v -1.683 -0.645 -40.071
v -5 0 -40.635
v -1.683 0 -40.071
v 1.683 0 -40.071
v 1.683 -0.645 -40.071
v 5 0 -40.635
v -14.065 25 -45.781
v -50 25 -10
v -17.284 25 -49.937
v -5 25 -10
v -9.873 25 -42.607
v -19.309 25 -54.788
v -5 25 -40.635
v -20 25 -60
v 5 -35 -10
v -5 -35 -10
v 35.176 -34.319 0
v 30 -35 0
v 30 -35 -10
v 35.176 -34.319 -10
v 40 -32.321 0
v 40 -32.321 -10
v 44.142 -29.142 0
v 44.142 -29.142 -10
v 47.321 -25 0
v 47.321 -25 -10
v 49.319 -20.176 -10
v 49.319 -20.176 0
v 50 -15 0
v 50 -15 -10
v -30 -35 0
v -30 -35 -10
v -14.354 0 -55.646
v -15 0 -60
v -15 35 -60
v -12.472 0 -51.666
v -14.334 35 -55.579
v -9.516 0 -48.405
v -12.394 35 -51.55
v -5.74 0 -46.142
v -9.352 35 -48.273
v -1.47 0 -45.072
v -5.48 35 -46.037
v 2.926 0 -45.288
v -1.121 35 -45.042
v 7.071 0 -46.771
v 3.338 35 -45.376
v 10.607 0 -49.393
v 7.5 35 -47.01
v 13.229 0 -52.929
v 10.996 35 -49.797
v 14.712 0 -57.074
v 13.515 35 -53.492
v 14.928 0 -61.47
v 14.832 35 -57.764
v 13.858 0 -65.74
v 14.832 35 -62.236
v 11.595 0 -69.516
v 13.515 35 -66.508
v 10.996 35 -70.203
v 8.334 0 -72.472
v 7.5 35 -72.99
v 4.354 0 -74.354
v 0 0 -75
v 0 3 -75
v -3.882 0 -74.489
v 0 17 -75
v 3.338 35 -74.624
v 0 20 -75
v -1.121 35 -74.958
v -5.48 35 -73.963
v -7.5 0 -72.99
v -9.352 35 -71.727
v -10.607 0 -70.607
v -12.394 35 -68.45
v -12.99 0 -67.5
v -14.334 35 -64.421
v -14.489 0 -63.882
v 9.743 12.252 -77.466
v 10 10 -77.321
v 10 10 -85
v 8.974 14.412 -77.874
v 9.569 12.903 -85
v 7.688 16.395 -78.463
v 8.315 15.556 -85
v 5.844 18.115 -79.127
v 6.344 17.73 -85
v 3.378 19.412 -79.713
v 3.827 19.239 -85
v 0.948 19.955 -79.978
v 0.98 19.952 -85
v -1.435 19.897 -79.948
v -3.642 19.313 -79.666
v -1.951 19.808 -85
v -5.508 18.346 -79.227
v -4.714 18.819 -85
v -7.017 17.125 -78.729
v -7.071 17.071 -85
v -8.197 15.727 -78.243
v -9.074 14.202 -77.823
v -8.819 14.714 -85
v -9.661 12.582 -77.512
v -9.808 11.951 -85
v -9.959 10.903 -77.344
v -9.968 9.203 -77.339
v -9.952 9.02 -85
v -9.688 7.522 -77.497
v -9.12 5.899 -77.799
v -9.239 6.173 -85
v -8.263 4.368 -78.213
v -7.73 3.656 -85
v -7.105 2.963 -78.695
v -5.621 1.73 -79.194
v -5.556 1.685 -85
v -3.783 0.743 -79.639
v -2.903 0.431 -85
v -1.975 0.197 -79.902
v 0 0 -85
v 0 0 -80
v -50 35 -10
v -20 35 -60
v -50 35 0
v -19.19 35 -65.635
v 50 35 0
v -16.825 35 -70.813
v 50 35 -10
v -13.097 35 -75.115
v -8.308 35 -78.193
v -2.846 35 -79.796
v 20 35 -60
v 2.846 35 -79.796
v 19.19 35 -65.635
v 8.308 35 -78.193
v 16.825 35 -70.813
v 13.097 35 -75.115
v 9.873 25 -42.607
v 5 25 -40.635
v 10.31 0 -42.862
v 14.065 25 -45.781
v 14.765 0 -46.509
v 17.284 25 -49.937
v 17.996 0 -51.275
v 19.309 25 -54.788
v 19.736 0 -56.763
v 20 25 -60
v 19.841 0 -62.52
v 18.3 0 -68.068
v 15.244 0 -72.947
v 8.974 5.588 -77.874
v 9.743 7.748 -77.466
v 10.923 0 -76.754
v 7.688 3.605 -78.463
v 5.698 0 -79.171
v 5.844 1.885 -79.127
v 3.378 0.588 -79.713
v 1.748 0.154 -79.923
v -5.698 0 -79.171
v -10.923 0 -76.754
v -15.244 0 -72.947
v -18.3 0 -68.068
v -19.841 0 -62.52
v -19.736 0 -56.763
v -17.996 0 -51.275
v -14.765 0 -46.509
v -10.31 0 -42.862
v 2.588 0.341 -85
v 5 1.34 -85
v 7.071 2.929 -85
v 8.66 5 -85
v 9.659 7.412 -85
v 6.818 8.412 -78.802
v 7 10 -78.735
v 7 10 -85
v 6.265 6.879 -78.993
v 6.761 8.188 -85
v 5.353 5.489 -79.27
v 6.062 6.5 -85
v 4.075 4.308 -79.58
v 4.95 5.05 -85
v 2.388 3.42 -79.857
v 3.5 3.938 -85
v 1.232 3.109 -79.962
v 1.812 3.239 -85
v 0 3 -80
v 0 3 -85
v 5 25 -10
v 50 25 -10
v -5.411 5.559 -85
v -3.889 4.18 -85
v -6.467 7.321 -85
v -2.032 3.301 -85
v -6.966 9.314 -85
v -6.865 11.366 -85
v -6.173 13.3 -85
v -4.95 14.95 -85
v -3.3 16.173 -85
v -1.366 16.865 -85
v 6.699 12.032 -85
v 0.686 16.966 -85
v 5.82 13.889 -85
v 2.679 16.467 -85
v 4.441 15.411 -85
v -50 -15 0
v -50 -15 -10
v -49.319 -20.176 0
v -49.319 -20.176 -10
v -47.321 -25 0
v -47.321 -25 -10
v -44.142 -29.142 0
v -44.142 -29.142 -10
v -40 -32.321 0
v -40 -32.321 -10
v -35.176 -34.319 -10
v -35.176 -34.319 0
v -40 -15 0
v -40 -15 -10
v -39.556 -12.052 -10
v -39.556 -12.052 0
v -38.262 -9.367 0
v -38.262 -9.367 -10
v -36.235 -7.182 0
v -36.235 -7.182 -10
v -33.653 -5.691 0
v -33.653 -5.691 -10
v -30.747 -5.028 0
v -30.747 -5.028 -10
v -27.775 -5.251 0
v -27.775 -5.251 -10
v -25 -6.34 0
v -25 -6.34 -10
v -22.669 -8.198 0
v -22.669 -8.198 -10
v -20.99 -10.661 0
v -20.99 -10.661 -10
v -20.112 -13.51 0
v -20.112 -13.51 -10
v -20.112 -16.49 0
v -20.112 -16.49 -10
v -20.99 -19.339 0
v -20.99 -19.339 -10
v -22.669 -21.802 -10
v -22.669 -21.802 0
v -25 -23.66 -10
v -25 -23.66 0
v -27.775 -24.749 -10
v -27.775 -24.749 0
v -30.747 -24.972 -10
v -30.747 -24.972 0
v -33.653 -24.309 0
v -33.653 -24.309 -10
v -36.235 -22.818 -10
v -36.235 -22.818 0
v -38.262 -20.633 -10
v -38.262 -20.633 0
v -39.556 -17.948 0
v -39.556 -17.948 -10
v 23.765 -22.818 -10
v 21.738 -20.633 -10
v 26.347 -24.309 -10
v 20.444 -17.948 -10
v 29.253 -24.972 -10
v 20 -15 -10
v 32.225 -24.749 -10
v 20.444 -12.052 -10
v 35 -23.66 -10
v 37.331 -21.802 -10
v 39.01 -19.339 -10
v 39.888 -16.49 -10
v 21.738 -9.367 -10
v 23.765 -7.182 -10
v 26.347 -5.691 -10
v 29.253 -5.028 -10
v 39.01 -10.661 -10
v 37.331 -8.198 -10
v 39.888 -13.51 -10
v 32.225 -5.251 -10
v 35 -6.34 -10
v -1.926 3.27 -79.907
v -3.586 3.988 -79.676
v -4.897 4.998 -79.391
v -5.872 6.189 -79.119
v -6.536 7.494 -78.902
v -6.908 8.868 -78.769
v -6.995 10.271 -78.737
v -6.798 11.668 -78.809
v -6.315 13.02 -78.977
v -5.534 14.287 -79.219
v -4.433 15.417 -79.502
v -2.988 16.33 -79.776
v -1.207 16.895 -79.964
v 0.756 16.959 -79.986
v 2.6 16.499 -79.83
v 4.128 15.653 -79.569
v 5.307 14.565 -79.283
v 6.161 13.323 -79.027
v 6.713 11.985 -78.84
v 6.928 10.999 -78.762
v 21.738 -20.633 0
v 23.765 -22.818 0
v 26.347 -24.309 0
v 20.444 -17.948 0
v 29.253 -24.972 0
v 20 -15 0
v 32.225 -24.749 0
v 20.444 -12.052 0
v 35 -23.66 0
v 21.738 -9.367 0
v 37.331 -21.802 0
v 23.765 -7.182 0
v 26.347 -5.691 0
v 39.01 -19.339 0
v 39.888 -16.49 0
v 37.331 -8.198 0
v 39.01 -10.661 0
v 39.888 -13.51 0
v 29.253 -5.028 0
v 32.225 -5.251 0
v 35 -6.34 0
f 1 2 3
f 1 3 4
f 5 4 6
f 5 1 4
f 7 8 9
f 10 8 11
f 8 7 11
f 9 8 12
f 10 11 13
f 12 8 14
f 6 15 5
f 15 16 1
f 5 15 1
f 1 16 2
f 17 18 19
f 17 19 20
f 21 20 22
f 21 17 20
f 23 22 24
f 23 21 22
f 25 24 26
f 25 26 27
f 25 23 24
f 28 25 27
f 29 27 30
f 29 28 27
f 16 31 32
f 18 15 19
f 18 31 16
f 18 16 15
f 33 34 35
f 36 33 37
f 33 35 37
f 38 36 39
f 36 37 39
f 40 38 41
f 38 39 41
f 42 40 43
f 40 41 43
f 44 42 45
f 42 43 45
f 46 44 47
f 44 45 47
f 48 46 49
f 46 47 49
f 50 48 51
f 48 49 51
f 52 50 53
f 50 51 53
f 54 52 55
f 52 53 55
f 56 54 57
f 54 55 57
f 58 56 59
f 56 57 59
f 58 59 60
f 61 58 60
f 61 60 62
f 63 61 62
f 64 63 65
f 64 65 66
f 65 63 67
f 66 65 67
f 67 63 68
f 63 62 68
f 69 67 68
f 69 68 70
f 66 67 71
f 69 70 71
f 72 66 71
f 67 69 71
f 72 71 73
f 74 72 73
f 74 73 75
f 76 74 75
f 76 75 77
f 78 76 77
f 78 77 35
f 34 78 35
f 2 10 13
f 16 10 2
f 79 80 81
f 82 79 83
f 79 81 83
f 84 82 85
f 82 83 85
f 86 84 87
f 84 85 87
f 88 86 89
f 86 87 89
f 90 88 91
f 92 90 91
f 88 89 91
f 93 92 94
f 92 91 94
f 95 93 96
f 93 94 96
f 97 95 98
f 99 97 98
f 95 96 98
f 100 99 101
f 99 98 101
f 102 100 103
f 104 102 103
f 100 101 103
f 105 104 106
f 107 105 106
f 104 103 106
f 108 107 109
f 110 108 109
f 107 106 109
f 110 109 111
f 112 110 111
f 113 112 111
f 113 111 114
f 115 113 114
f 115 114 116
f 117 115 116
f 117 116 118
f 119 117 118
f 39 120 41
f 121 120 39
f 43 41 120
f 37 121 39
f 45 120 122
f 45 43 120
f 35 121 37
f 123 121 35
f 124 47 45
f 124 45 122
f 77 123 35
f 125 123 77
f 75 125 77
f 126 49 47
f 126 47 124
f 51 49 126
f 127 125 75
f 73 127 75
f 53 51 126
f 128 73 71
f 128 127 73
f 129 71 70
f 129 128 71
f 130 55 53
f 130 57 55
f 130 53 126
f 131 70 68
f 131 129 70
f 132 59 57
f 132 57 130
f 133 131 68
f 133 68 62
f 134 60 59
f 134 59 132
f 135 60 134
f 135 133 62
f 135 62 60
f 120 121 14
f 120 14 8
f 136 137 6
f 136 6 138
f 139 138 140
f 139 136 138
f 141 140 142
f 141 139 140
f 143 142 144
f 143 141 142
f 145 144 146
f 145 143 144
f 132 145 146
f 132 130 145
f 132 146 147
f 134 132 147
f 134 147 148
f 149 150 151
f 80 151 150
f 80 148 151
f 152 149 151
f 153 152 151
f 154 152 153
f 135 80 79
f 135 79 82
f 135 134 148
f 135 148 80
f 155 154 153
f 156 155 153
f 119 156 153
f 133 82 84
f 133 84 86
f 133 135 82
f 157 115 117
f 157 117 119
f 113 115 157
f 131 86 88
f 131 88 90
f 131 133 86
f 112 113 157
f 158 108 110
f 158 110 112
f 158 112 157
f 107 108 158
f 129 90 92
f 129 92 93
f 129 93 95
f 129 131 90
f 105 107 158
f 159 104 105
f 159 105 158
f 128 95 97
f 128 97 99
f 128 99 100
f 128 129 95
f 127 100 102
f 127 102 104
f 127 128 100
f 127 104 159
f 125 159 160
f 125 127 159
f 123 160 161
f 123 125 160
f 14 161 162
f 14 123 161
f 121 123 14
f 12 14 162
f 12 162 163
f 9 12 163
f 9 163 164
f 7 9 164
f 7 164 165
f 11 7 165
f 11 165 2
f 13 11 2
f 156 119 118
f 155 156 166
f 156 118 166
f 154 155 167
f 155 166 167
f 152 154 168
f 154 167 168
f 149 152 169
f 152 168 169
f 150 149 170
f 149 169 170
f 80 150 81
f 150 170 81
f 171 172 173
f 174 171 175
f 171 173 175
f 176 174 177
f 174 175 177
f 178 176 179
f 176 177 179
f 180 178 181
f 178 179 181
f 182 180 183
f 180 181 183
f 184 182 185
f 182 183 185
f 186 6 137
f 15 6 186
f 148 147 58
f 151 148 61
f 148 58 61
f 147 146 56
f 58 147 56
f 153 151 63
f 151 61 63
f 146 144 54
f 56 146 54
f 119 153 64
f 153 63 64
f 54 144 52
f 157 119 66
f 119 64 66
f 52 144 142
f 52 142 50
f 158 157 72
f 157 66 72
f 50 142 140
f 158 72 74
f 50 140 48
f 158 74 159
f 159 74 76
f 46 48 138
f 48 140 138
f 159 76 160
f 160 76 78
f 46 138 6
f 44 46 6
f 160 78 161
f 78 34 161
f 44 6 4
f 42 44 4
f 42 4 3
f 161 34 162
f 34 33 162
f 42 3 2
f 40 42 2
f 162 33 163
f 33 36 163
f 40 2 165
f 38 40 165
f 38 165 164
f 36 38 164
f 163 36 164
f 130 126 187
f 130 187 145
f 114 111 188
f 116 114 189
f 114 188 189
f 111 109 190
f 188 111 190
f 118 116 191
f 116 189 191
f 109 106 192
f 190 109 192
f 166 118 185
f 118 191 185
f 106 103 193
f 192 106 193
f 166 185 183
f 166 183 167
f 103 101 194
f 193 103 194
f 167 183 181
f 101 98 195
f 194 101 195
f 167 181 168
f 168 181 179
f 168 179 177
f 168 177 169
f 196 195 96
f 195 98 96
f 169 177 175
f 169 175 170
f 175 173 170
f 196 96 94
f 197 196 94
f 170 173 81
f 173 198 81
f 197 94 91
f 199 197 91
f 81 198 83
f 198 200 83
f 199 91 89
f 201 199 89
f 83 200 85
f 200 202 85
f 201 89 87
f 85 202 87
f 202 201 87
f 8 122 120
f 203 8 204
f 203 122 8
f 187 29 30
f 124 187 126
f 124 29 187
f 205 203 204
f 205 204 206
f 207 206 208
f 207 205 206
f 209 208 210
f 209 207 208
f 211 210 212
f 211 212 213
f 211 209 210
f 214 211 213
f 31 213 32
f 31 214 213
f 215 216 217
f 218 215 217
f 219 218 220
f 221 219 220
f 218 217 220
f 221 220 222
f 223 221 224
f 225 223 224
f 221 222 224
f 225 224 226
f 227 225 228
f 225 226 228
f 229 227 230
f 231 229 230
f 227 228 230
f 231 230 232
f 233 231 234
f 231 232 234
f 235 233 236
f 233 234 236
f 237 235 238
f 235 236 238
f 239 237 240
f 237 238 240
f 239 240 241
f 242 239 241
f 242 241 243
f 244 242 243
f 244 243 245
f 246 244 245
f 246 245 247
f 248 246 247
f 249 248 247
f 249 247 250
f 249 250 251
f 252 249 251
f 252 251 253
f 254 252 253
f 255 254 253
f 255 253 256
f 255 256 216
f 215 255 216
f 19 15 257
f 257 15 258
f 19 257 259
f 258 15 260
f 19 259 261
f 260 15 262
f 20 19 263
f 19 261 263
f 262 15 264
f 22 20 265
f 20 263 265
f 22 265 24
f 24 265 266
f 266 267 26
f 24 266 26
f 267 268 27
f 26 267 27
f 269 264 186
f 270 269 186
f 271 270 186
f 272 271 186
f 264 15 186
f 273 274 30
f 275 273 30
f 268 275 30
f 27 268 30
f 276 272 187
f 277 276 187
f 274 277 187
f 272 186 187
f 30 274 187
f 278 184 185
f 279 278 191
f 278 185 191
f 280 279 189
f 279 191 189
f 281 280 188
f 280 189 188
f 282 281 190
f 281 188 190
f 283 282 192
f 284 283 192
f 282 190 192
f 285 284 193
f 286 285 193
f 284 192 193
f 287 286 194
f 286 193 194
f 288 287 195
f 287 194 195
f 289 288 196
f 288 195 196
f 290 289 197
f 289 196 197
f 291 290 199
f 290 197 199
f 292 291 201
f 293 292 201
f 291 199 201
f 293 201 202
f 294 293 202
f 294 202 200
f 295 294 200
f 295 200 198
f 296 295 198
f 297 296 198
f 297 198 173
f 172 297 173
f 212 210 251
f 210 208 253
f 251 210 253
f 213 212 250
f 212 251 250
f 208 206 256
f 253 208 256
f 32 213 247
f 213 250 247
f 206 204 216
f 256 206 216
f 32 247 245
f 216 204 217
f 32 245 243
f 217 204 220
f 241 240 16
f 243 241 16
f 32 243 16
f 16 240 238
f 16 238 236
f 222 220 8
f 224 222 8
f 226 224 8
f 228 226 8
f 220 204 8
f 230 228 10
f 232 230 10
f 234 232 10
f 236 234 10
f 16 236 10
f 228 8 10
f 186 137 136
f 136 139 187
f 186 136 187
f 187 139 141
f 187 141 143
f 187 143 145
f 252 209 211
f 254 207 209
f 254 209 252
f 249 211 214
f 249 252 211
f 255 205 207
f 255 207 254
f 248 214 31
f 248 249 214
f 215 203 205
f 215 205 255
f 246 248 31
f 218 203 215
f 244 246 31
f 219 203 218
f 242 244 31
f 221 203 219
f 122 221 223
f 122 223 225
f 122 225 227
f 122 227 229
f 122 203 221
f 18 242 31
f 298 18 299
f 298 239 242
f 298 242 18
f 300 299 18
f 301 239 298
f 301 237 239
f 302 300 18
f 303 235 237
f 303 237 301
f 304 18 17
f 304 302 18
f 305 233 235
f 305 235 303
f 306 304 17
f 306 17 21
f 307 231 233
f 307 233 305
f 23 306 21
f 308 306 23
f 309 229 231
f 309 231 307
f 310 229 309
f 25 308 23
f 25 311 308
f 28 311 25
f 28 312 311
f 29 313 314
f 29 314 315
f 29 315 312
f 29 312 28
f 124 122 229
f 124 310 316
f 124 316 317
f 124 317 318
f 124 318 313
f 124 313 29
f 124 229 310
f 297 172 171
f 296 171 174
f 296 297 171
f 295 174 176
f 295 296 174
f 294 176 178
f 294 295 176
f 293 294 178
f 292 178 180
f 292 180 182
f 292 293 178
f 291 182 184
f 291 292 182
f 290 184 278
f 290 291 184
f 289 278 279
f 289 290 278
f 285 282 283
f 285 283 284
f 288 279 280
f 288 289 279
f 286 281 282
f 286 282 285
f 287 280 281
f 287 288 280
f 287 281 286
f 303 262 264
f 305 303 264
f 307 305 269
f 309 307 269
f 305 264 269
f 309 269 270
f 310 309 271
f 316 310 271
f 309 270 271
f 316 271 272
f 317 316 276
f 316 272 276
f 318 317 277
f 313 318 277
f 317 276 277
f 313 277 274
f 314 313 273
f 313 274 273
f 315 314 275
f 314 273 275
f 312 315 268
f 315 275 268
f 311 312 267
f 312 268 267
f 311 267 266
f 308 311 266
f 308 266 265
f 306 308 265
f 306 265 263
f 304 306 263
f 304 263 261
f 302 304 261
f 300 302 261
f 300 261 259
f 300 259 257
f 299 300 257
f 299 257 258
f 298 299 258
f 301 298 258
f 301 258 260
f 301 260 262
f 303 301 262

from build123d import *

# Parameters (mm, degrees)
EXTRUDE_1_DEPTH     = 10
SKETCH_2_R          = 10
CUT_EXTRUDE_1_DEPTH = 62.846584384
SKETCH_3_R          = 20
SKETCH_3_R_2        = 15
EXTRUDE_2_DEPTH     = 35
EXTRUDE_3_DEPTH     = 10
EXTRUDE_4_REACH     = 119.473
CUT_EXTRUDE_3_DEPTH = 10
EXTRUDE_5_DEPTH     = 10


with BuildPart() as part:
    # 草圖1 → 填料-伸長1 (new body)
    with BuildSketch(Plane.XY):
        with BuildLine():
            Line((50, 35), (-50, 35))
            Line((-50, 35), (-50, -15))
            ThreePointArc((-50, -15), (-44.142135624, -29.142135624), (-30, -35))
            Line((-30, -35), (30, -35))
            ThreePointArc((30, -35), (44.142135624, -29.142135624), (50, -15))
            Line((50, -15), (50, 35))
        make_face()
    extrude(amount=-EXTRUDE_1_DEPTH)

    # 草圖2 → 除料-伸長1 (cut, through all)
    with BuildSketch(Plane(origin=(0, 0, -10), x_dir=(-1, 0, 0), z_dir=(0, 0, -1))):
        with Locations((-30, -15)):
            Circle(SKETCH_2_R)
        with Locations((30, -15)):
            Circle(SKETCH_2_R)
    extrude(amount=-CUT_EXTRUDE_1_DEPTH, mode=Mode.SUBTRACT)



with BuildPart() as body_2:
    # 草圖3 → 填料-伸長2 (new body)
    with BuildSketch(Plane(origin=(0, 35, 0), x_dir=(1, 0, 0), z_dir=(0, 1, 0))):
        with Locations(Location((0, 60, 0), (0, 0, 180))):
            Circle(SKETCH_3_R)
        with Locations(Location((0, 60, 0), (0, 0, 180))):
            Circle(SKETCH_3_R_2, mode=Mode.SUBTRACT)
    extrude(amount=-EXTRUDE_2_DEPTH)


with BuildPart() as part_1:
    add(part.part)

    add(body_2.part)  # 填料-伸長3 merges body 2
    # 草圖4 → 填料-伸長3 (add)
    with BuildSketch(Plane(origin=(0, 35, 0), x_dir=(1, 0, 0), z_dir=(0, 1, 0))):
        with BuildLine():
            Line((-20, 60), (-50, 10))
            Line((-50, 10), (50, 10))
            Line((50, 10), (20, 60))
            ThreePointArc((20, 60), (0, 40), (-20, 60))
        make_face()
    extrude(amount=-EXTRUDE_3_DEPTH)

    # 填料-伸長4: up to this face of the body (flat: up to its plane)
    extrude_4_end = Plane(part_1.part.faces().sort_by_distance((0, 25, -27.034412528))[0])
    # 草圖6 → 填料-伸長4 (add, up to the picked face)
    with BuildSketch(Plane.XZ.offset(35), mode=Mode.PRIVATE) as extrude_4_sk1:
        with BuildLine():
            Line((5, -40.635083269), (5, -10))
            Line((5, -10), (0, -10))
            Line((0, -10), (-5, -10))
            Line((-5, -10), (-5, -40.635083269))
            ThreePointArc((-5, -40.635083269), (0, -40), (5, -40.635083269))
        make_face()
    extrude_4_tool1 = split(extrude(extrude_4_sk1.sketch, amount=-EXTRUDE_4_REACH, mode=Mode.PRIVATE), bisect_by=extrude_4_end, keep=Keep.BOTH, mode=Mode.PRIVATE)
    add(extrude_4_tool1.solids().sort_by(Axis((0, -35, -25.105756), (0, 1, 0)))[0])

    # 草圖7 → 除料-伸長3 (cut)
    with BuildSketch(Plane.ZY.offset(5)):
        Polygon((-10, -35), (-40.635083269, 0), (-40.635083269, -35), align=None)
    extrude(amount=-CUT_EXTRUDE_3_DEPTH, mode=Mode.SUBTRACT)

    # 草圖8 → 填料-伸長5 (add)
    # profile 1 of 2: a face of its own
    with BuildSketch(Plane.XY.offset(-85)):
        with BuildLine():
            ThreePointArc((10, 10), (-7.071067812, 17.071067812), (0, 0))
            ThreePointArc((0, 0), (7.071067812, 2.928932188), (10, 10))
        make_face()
        with BuildLine():
            ThreePointArc((7, 10), (4.949747468, 5.050252532), (0, 3))
            ThreePointArc((0, 3), (-4.949747468, 14.949747468), (7, 10))
        make_face(mode=Mode.SUBTRACT)
    # profile 2 of 2: a face of its own
    with BuildSketch(Plane.XY.offset(-85)):
        with BuildLine():
            ThreePointArc((10, 10), (-7.071067812, 17.071067812), (0, 0))
            ThreePointArc((0, 0), (7.071067812, 2.928932188), (10, 10))
        make_face()
        with BuildLine():
            ThreePointArc((7, 10), (4.949747468, 5.050252532), (0, 3))
            ThreePointArc((0, 3), (-4.949747468, 14.949747468), (7, 10))
        make_face(mode=Mode.SUBTRACT)
    extrude(amount=EXTRUDE_5_DEPTH)


solid = part_1.part
